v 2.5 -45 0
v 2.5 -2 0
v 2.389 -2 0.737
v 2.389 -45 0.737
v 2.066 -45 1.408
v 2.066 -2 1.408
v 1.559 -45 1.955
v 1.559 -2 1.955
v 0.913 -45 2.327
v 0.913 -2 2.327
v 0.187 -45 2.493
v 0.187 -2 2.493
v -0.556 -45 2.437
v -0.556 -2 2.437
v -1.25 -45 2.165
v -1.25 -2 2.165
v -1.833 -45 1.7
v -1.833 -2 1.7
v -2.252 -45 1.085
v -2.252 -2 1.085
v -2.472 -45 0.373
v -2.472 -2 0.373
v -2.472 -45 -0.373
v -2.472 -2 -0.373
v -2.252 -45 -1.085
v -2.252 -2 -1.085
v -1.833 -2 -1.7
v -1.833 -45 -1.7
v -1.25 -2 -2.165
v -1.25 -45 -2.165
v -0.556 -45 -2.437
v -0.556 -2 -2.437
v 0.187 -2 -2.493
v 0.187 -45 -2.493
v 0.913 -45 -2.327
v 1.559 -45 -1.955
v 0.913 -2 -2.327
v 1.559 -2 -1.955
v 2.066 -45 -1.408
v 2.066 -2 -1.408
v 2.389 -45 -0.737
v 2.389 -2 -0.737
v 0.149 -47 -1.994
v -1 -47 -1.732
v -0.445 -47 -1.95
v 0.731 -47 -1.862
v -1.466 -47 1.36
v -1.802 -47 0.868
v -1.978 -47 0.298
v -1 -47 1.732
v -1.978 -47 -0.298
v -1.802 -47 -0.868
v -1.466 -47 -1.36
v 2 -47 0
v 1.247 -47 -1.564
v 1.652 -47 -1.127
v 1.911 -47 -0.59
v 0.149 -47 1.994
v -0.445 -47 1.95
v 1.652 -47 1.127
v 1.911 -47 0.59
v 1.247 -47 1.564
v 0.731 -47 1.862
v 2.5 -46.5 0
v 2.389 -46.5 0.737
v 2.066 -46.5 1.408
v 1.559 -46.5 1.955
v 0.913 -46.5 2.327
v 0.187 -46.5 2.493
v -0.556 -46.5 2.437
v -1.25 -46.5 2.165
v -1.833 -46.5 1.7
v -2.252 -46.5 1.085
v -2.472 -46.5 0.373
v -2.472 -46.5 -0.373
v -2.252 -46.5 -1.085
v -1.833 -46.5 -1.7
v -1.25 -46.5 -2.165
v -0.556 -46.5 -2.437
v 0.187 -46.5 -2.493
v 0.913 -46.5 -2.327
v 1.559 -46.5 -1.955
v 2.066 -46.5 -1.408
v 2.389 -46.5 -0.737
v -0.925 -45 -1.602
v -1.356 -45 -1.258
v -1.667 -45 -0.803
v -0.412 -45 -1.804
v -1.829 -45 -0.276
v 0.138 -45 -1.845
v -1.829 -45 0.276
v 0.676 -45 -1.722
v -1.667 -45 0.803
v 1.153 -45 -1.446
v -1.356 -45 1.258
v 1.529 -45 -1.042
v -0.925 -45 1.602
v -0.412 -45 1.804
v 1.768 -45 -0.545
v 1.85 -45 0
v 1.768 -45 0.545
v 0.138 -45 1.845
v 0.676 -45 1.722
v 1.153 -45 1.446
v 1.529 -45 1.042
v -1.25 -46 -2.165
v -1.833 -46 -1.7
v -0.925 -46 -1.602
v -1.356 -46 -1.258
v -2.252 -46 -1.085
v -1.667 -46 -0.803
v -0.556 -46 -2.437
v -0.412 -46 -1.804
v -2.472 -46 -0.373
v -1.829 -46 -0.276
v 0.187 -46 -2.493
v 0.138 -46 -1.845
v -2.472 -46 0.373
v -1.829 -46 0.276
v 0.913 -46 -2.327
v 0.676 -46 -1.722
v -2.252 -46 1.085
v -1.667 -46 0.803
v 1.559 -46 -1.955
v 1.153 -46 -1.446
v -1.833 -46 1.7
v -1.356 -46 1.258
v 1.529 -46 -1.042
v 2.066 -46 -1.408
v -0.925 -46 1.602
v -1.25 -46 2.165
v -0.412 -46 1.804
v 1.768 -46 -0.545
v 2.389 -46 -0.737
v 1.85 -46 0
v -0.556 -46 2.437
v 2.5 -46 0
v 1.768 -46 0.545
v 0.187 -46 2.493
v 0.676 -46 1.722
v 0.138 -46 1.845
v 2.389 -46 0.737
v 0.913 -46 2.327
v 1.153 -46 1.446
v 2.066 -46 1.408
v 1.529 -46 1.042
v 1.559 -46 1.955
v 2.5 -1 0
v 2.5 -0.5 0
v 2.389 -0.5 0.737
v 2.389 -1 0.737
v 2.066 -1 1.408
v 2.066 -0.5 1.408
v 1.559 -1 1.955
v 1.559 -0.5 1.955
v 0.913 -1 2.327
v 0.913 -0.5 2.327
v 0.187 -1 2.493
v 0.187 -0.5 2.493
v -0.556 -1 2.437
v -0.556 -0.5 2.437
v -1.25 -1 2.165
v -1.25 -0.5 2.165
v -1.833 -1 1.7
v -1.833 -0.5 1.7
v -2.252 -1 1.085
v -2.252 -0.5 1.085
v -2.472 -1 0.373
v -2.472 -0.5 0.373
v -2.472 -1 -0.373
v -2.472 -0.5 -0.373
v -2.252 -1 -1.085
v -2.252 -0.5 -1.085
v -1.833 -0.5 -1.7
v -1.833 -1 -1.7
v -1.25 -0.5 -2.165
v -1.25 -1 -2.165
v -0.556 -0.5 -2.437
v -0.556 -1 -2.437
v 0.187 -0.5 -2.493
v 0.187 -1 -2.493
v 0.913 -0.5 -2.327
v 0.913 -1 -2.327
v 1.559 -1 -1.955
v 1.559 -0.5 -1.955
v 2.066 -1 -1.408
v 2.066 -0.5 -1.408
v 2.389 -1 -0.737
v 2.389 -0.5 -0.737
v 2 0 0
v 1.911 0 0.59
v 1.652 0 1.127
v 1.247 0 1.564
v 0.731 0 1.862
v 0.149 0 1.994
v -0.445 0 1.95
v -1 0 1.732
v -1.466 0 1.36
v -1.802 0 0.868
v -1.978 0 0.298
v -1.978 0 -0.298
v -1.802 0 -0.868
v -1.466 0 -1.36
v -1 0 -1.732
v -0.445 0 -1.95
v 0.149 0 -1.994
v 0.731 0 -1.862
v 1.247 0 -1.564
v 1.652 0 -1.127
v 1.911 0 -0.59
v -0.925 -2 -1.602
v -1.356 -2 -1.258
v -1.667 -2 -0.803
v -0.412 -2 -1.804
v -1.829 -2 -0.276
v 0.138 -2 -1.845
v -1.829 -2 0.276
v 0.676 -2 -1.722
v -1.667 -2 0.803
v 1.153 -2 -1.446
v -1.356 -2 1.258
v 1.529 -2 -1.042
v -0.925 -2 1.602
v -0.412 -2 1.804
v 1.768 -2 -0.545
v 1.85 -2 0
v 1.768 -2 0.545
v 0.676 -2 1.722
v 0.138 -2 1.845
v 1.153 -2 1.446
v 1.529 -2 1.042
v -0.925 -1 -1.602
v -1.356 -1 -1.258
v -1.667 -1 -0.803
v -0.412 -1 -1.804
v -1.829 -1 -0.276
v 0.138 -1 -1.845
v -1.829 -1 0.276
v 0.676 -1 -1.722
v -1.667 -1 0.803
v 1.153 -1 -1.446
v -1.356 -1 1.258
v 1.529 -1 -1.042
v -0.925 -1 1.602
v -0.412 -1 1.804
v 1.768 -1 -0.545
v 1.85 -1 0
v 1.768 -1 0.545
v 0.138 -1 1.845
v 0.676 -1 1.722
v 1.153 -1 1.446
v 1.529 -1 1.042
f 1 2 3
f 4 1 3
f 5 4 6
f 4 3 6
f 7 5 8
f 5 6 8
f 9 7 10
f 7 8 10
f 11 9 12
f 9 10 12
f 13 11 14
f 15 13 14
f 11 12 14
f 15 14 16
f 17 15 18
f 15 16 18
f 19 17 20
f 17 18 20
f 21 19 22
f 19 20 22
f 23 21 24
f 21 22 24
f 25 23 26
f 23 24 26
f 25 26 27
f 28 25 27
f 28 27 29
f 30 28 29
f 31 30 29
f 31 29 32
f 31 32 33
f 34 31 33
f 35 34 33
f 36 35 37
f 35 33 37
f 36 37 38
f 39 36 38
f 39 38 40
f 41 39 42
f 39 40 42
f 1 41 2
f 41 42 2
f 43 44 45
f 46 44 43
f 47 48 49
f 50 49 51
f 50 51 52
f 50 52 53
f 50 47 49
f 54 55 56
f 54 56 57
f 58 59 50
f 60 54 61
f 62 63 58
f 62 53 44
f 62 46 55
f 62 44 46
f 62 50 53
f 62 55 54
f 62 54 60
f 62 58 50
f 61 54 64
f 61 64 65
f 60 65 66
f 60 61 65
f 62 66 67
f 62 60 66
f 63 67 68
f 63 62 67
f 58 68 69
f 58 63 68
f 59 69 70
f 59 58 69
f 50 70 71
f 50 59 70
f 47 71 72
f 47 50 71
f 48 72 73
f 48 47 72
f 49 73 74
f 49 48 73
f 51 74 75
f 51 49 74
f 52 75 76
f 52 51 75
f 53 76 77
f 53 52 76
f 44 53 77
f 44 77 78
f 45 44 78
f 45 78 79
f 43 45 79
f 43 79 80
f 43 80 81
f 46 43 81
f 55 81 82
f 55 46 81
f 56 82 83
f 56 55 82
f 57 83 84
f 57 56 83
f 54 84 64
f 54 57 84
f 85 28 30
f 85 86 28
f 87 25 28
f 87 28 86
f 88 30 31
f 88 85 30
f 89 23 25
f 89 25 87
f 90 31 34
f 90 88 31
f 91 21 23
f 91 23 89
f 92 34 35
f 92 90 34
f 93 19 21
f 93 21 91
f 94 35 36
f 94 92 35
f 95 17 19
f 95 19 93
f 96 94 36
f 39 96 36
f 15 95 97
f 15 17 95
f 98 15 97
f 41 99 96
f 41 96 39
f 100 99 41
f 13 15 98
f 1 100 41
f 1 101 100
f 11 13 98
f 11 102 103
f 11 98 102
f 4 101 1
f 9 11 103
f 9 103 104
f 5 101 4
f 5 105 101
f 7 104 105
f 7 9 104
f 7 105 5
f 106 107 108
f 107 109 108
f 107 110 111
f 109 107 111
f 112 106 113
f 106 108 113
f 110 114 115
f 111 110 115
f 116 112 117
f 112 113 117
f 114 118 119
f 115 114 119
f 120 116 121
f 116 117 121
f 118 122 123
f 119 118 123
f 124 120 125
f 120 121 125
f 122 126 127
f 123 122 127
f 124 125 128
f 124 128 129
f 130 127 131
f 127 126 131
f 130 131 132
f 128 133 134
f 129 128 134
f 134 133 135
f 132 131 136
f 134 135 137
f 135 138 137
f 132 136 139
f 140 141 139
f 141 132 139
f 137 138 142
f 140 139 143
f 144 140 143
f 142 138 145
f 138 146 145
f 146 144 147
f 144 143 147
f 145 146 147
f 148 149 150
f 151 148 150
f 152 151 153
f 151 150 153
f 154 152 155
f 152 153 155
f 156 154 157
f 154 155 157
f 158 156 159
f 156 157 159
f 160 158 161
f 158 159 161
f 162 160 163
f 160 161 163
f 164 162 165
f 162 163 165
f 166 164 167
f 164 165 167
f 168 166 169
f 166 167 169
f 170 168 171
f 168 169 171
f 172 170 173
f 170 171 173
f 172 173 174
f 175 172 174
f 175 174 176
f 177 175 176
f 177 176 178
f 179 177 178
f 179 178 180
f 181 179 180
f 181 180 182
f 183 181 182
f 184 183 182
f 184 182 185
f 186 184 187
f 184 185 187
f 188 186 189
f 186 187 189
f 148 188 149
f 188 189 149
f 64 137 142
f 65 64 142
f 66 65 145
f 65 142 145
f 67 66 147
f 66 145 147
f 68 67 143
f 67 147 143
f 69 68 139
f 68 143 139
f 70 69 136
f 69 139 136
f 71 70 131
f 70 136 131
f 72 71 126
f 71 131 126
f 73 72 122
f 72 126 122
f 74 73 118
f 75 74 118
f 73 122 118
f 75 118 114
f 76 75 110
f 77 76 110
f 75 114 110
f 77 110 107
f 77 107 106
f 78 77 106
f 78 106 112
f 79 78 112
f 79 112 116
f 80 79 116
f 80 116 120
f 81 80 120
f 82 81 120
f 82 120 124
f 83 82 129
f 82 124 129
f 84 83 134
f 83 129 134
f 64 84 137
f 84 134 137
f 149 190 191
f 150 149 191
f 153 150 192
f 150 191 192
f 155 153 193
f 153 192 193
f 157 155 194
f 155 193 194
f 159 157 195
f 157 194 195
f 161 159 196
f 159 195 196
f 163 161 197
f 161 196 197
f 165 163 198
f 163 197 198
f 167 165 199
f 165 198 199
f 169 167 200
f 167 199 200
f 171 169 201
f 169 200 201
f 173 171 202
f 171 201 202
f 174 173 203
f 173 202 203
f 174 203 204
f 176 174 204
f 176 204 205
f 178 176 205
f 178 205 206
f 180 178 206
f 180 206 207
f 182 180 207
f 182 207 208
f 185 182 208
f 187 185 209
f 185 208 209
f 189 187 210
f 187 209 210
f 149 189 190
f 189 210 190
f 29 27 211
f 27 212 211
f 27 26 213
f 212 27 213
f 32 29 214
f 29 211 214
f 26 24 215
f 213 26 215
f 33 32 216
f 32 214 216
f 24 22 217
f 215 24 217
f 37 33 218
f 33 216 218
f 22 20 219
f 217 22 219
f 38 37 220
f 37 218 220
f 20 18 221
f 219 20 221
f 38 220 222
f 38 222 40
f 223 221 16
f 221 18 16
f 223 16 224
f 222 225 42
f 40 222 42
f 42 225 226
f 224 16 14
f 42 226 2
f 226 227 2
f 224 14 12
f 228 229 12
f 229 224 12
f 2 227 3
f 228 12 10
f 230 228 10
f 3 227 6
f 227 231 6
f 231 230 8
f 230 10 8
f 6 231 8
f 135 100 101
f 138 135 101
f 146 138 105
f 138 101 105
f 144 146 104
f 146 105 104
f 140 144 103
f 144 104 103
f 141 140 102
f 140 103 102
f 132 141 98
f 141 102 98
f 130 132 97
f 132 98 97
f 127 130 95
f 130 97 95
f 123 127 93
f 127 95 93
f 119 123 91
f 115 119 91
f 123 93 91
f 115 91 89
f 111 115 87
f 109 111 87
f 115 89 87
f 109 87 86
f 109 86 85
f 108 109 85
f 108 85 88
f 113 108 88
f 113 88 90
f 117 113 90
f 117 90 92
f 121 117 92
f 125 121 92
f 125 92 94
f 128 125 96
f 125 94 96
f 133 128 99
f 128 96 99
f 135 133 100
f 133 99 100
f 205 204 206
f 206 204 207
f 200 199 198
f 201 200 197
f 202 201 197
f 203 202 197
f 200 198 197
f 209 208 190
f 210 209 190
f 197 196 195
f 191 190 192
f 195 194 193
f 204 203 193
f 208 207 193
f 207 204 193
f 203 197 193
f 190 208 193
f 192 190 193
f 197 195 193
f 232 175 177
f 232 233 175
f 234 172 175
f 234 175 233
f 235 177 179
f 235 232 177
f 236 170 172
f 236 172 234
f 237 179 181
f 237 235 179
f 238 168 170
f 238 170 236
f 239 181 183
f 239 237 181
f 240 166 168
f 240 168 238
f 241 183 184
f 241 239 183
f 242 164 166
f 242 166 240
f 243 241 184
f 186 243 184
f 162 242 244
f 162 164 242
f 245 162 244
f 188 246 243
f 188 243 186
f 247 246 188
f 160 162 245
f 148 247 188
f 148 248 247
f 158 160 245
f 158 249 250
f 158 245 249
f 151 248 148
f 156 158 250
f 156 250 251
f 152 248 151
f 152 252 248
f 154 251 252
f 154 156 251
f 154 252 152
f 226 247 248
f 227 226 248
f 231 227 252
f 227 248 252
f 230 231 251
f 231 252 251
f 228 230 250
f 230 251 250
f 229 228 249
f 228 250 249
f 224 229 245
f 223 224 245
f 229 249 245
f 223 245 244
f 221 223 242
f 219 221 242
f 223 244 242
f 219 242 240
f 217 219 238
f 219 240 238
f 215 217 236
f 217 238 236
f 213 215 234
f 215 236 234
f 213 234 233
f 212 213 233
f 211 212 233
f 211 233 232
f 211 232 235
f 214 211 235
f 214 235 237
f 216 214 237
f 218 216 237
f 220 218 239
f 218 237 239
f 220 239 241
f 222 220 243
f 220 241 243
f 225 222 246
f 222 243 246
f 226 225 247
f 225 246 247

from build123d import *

# Parameters (mm, degrees)
F0_R     = 2.5
F1_DEPTH = 1
F2_R     = 1.85
F3_DEPTH = 1
F4_R     = 2.5
F4_R_2   = 1.85
F5_DEPTH = 43
F6_R     = 1.85
F7_DEPTH = 1
F8_R     = 2.5
F8_R_2   = 1.85
F9_DEPTH = 1
F10_SIZE = 0.5


with BuildPart() as f1:
    # F0 (on Front) → F1 (new body)
    with BuildSketch(Plane.XZ):
        Circle(F0_R)
    extrude(amount=F1_DEPTH)

    # F2 (on face) → F3 (join)
    with BuildSketch(Plane.XZ.offset(1)):
        Circle(F2_R)
    extrude(amount=F3_DEPTH)

    # F4 (on face) → F5 (join)
    with BuildSketch(Plane.XZ.offset(2)):
        Circle(F4_R)
        Circle(F4_R_2, mode=Mode.SUBTRACT)
        Circle(F4_R_2)
    extrude(amount=F5_DEPTH)

    # F6 (on face) → F7 (join)
    with BuildSketch(Plane.XZ.offset(45)):
        Circle(F6_R)
    extrude(amount=F7_DEPTH)

    # F8 (on face) → F9 (join)
    with BuildSketch(Plane.XZ.offset(46)):
        Circle(F8_R)
        Circle(F8_R_2, mode=Mode.SUBTRACT)
        Circle(F8_R_2)
    extrude(amount=F9_DEPTH)

    # F10
    f10_edges = [f1.edges().sort_by_distance(p)[0] for p in [
        (-2.5, -47, 0),
        (-2.5, 0, 0),
    ]]
    chamfer(f10_edges, length=F10_SIZE)


solid = f1.part
